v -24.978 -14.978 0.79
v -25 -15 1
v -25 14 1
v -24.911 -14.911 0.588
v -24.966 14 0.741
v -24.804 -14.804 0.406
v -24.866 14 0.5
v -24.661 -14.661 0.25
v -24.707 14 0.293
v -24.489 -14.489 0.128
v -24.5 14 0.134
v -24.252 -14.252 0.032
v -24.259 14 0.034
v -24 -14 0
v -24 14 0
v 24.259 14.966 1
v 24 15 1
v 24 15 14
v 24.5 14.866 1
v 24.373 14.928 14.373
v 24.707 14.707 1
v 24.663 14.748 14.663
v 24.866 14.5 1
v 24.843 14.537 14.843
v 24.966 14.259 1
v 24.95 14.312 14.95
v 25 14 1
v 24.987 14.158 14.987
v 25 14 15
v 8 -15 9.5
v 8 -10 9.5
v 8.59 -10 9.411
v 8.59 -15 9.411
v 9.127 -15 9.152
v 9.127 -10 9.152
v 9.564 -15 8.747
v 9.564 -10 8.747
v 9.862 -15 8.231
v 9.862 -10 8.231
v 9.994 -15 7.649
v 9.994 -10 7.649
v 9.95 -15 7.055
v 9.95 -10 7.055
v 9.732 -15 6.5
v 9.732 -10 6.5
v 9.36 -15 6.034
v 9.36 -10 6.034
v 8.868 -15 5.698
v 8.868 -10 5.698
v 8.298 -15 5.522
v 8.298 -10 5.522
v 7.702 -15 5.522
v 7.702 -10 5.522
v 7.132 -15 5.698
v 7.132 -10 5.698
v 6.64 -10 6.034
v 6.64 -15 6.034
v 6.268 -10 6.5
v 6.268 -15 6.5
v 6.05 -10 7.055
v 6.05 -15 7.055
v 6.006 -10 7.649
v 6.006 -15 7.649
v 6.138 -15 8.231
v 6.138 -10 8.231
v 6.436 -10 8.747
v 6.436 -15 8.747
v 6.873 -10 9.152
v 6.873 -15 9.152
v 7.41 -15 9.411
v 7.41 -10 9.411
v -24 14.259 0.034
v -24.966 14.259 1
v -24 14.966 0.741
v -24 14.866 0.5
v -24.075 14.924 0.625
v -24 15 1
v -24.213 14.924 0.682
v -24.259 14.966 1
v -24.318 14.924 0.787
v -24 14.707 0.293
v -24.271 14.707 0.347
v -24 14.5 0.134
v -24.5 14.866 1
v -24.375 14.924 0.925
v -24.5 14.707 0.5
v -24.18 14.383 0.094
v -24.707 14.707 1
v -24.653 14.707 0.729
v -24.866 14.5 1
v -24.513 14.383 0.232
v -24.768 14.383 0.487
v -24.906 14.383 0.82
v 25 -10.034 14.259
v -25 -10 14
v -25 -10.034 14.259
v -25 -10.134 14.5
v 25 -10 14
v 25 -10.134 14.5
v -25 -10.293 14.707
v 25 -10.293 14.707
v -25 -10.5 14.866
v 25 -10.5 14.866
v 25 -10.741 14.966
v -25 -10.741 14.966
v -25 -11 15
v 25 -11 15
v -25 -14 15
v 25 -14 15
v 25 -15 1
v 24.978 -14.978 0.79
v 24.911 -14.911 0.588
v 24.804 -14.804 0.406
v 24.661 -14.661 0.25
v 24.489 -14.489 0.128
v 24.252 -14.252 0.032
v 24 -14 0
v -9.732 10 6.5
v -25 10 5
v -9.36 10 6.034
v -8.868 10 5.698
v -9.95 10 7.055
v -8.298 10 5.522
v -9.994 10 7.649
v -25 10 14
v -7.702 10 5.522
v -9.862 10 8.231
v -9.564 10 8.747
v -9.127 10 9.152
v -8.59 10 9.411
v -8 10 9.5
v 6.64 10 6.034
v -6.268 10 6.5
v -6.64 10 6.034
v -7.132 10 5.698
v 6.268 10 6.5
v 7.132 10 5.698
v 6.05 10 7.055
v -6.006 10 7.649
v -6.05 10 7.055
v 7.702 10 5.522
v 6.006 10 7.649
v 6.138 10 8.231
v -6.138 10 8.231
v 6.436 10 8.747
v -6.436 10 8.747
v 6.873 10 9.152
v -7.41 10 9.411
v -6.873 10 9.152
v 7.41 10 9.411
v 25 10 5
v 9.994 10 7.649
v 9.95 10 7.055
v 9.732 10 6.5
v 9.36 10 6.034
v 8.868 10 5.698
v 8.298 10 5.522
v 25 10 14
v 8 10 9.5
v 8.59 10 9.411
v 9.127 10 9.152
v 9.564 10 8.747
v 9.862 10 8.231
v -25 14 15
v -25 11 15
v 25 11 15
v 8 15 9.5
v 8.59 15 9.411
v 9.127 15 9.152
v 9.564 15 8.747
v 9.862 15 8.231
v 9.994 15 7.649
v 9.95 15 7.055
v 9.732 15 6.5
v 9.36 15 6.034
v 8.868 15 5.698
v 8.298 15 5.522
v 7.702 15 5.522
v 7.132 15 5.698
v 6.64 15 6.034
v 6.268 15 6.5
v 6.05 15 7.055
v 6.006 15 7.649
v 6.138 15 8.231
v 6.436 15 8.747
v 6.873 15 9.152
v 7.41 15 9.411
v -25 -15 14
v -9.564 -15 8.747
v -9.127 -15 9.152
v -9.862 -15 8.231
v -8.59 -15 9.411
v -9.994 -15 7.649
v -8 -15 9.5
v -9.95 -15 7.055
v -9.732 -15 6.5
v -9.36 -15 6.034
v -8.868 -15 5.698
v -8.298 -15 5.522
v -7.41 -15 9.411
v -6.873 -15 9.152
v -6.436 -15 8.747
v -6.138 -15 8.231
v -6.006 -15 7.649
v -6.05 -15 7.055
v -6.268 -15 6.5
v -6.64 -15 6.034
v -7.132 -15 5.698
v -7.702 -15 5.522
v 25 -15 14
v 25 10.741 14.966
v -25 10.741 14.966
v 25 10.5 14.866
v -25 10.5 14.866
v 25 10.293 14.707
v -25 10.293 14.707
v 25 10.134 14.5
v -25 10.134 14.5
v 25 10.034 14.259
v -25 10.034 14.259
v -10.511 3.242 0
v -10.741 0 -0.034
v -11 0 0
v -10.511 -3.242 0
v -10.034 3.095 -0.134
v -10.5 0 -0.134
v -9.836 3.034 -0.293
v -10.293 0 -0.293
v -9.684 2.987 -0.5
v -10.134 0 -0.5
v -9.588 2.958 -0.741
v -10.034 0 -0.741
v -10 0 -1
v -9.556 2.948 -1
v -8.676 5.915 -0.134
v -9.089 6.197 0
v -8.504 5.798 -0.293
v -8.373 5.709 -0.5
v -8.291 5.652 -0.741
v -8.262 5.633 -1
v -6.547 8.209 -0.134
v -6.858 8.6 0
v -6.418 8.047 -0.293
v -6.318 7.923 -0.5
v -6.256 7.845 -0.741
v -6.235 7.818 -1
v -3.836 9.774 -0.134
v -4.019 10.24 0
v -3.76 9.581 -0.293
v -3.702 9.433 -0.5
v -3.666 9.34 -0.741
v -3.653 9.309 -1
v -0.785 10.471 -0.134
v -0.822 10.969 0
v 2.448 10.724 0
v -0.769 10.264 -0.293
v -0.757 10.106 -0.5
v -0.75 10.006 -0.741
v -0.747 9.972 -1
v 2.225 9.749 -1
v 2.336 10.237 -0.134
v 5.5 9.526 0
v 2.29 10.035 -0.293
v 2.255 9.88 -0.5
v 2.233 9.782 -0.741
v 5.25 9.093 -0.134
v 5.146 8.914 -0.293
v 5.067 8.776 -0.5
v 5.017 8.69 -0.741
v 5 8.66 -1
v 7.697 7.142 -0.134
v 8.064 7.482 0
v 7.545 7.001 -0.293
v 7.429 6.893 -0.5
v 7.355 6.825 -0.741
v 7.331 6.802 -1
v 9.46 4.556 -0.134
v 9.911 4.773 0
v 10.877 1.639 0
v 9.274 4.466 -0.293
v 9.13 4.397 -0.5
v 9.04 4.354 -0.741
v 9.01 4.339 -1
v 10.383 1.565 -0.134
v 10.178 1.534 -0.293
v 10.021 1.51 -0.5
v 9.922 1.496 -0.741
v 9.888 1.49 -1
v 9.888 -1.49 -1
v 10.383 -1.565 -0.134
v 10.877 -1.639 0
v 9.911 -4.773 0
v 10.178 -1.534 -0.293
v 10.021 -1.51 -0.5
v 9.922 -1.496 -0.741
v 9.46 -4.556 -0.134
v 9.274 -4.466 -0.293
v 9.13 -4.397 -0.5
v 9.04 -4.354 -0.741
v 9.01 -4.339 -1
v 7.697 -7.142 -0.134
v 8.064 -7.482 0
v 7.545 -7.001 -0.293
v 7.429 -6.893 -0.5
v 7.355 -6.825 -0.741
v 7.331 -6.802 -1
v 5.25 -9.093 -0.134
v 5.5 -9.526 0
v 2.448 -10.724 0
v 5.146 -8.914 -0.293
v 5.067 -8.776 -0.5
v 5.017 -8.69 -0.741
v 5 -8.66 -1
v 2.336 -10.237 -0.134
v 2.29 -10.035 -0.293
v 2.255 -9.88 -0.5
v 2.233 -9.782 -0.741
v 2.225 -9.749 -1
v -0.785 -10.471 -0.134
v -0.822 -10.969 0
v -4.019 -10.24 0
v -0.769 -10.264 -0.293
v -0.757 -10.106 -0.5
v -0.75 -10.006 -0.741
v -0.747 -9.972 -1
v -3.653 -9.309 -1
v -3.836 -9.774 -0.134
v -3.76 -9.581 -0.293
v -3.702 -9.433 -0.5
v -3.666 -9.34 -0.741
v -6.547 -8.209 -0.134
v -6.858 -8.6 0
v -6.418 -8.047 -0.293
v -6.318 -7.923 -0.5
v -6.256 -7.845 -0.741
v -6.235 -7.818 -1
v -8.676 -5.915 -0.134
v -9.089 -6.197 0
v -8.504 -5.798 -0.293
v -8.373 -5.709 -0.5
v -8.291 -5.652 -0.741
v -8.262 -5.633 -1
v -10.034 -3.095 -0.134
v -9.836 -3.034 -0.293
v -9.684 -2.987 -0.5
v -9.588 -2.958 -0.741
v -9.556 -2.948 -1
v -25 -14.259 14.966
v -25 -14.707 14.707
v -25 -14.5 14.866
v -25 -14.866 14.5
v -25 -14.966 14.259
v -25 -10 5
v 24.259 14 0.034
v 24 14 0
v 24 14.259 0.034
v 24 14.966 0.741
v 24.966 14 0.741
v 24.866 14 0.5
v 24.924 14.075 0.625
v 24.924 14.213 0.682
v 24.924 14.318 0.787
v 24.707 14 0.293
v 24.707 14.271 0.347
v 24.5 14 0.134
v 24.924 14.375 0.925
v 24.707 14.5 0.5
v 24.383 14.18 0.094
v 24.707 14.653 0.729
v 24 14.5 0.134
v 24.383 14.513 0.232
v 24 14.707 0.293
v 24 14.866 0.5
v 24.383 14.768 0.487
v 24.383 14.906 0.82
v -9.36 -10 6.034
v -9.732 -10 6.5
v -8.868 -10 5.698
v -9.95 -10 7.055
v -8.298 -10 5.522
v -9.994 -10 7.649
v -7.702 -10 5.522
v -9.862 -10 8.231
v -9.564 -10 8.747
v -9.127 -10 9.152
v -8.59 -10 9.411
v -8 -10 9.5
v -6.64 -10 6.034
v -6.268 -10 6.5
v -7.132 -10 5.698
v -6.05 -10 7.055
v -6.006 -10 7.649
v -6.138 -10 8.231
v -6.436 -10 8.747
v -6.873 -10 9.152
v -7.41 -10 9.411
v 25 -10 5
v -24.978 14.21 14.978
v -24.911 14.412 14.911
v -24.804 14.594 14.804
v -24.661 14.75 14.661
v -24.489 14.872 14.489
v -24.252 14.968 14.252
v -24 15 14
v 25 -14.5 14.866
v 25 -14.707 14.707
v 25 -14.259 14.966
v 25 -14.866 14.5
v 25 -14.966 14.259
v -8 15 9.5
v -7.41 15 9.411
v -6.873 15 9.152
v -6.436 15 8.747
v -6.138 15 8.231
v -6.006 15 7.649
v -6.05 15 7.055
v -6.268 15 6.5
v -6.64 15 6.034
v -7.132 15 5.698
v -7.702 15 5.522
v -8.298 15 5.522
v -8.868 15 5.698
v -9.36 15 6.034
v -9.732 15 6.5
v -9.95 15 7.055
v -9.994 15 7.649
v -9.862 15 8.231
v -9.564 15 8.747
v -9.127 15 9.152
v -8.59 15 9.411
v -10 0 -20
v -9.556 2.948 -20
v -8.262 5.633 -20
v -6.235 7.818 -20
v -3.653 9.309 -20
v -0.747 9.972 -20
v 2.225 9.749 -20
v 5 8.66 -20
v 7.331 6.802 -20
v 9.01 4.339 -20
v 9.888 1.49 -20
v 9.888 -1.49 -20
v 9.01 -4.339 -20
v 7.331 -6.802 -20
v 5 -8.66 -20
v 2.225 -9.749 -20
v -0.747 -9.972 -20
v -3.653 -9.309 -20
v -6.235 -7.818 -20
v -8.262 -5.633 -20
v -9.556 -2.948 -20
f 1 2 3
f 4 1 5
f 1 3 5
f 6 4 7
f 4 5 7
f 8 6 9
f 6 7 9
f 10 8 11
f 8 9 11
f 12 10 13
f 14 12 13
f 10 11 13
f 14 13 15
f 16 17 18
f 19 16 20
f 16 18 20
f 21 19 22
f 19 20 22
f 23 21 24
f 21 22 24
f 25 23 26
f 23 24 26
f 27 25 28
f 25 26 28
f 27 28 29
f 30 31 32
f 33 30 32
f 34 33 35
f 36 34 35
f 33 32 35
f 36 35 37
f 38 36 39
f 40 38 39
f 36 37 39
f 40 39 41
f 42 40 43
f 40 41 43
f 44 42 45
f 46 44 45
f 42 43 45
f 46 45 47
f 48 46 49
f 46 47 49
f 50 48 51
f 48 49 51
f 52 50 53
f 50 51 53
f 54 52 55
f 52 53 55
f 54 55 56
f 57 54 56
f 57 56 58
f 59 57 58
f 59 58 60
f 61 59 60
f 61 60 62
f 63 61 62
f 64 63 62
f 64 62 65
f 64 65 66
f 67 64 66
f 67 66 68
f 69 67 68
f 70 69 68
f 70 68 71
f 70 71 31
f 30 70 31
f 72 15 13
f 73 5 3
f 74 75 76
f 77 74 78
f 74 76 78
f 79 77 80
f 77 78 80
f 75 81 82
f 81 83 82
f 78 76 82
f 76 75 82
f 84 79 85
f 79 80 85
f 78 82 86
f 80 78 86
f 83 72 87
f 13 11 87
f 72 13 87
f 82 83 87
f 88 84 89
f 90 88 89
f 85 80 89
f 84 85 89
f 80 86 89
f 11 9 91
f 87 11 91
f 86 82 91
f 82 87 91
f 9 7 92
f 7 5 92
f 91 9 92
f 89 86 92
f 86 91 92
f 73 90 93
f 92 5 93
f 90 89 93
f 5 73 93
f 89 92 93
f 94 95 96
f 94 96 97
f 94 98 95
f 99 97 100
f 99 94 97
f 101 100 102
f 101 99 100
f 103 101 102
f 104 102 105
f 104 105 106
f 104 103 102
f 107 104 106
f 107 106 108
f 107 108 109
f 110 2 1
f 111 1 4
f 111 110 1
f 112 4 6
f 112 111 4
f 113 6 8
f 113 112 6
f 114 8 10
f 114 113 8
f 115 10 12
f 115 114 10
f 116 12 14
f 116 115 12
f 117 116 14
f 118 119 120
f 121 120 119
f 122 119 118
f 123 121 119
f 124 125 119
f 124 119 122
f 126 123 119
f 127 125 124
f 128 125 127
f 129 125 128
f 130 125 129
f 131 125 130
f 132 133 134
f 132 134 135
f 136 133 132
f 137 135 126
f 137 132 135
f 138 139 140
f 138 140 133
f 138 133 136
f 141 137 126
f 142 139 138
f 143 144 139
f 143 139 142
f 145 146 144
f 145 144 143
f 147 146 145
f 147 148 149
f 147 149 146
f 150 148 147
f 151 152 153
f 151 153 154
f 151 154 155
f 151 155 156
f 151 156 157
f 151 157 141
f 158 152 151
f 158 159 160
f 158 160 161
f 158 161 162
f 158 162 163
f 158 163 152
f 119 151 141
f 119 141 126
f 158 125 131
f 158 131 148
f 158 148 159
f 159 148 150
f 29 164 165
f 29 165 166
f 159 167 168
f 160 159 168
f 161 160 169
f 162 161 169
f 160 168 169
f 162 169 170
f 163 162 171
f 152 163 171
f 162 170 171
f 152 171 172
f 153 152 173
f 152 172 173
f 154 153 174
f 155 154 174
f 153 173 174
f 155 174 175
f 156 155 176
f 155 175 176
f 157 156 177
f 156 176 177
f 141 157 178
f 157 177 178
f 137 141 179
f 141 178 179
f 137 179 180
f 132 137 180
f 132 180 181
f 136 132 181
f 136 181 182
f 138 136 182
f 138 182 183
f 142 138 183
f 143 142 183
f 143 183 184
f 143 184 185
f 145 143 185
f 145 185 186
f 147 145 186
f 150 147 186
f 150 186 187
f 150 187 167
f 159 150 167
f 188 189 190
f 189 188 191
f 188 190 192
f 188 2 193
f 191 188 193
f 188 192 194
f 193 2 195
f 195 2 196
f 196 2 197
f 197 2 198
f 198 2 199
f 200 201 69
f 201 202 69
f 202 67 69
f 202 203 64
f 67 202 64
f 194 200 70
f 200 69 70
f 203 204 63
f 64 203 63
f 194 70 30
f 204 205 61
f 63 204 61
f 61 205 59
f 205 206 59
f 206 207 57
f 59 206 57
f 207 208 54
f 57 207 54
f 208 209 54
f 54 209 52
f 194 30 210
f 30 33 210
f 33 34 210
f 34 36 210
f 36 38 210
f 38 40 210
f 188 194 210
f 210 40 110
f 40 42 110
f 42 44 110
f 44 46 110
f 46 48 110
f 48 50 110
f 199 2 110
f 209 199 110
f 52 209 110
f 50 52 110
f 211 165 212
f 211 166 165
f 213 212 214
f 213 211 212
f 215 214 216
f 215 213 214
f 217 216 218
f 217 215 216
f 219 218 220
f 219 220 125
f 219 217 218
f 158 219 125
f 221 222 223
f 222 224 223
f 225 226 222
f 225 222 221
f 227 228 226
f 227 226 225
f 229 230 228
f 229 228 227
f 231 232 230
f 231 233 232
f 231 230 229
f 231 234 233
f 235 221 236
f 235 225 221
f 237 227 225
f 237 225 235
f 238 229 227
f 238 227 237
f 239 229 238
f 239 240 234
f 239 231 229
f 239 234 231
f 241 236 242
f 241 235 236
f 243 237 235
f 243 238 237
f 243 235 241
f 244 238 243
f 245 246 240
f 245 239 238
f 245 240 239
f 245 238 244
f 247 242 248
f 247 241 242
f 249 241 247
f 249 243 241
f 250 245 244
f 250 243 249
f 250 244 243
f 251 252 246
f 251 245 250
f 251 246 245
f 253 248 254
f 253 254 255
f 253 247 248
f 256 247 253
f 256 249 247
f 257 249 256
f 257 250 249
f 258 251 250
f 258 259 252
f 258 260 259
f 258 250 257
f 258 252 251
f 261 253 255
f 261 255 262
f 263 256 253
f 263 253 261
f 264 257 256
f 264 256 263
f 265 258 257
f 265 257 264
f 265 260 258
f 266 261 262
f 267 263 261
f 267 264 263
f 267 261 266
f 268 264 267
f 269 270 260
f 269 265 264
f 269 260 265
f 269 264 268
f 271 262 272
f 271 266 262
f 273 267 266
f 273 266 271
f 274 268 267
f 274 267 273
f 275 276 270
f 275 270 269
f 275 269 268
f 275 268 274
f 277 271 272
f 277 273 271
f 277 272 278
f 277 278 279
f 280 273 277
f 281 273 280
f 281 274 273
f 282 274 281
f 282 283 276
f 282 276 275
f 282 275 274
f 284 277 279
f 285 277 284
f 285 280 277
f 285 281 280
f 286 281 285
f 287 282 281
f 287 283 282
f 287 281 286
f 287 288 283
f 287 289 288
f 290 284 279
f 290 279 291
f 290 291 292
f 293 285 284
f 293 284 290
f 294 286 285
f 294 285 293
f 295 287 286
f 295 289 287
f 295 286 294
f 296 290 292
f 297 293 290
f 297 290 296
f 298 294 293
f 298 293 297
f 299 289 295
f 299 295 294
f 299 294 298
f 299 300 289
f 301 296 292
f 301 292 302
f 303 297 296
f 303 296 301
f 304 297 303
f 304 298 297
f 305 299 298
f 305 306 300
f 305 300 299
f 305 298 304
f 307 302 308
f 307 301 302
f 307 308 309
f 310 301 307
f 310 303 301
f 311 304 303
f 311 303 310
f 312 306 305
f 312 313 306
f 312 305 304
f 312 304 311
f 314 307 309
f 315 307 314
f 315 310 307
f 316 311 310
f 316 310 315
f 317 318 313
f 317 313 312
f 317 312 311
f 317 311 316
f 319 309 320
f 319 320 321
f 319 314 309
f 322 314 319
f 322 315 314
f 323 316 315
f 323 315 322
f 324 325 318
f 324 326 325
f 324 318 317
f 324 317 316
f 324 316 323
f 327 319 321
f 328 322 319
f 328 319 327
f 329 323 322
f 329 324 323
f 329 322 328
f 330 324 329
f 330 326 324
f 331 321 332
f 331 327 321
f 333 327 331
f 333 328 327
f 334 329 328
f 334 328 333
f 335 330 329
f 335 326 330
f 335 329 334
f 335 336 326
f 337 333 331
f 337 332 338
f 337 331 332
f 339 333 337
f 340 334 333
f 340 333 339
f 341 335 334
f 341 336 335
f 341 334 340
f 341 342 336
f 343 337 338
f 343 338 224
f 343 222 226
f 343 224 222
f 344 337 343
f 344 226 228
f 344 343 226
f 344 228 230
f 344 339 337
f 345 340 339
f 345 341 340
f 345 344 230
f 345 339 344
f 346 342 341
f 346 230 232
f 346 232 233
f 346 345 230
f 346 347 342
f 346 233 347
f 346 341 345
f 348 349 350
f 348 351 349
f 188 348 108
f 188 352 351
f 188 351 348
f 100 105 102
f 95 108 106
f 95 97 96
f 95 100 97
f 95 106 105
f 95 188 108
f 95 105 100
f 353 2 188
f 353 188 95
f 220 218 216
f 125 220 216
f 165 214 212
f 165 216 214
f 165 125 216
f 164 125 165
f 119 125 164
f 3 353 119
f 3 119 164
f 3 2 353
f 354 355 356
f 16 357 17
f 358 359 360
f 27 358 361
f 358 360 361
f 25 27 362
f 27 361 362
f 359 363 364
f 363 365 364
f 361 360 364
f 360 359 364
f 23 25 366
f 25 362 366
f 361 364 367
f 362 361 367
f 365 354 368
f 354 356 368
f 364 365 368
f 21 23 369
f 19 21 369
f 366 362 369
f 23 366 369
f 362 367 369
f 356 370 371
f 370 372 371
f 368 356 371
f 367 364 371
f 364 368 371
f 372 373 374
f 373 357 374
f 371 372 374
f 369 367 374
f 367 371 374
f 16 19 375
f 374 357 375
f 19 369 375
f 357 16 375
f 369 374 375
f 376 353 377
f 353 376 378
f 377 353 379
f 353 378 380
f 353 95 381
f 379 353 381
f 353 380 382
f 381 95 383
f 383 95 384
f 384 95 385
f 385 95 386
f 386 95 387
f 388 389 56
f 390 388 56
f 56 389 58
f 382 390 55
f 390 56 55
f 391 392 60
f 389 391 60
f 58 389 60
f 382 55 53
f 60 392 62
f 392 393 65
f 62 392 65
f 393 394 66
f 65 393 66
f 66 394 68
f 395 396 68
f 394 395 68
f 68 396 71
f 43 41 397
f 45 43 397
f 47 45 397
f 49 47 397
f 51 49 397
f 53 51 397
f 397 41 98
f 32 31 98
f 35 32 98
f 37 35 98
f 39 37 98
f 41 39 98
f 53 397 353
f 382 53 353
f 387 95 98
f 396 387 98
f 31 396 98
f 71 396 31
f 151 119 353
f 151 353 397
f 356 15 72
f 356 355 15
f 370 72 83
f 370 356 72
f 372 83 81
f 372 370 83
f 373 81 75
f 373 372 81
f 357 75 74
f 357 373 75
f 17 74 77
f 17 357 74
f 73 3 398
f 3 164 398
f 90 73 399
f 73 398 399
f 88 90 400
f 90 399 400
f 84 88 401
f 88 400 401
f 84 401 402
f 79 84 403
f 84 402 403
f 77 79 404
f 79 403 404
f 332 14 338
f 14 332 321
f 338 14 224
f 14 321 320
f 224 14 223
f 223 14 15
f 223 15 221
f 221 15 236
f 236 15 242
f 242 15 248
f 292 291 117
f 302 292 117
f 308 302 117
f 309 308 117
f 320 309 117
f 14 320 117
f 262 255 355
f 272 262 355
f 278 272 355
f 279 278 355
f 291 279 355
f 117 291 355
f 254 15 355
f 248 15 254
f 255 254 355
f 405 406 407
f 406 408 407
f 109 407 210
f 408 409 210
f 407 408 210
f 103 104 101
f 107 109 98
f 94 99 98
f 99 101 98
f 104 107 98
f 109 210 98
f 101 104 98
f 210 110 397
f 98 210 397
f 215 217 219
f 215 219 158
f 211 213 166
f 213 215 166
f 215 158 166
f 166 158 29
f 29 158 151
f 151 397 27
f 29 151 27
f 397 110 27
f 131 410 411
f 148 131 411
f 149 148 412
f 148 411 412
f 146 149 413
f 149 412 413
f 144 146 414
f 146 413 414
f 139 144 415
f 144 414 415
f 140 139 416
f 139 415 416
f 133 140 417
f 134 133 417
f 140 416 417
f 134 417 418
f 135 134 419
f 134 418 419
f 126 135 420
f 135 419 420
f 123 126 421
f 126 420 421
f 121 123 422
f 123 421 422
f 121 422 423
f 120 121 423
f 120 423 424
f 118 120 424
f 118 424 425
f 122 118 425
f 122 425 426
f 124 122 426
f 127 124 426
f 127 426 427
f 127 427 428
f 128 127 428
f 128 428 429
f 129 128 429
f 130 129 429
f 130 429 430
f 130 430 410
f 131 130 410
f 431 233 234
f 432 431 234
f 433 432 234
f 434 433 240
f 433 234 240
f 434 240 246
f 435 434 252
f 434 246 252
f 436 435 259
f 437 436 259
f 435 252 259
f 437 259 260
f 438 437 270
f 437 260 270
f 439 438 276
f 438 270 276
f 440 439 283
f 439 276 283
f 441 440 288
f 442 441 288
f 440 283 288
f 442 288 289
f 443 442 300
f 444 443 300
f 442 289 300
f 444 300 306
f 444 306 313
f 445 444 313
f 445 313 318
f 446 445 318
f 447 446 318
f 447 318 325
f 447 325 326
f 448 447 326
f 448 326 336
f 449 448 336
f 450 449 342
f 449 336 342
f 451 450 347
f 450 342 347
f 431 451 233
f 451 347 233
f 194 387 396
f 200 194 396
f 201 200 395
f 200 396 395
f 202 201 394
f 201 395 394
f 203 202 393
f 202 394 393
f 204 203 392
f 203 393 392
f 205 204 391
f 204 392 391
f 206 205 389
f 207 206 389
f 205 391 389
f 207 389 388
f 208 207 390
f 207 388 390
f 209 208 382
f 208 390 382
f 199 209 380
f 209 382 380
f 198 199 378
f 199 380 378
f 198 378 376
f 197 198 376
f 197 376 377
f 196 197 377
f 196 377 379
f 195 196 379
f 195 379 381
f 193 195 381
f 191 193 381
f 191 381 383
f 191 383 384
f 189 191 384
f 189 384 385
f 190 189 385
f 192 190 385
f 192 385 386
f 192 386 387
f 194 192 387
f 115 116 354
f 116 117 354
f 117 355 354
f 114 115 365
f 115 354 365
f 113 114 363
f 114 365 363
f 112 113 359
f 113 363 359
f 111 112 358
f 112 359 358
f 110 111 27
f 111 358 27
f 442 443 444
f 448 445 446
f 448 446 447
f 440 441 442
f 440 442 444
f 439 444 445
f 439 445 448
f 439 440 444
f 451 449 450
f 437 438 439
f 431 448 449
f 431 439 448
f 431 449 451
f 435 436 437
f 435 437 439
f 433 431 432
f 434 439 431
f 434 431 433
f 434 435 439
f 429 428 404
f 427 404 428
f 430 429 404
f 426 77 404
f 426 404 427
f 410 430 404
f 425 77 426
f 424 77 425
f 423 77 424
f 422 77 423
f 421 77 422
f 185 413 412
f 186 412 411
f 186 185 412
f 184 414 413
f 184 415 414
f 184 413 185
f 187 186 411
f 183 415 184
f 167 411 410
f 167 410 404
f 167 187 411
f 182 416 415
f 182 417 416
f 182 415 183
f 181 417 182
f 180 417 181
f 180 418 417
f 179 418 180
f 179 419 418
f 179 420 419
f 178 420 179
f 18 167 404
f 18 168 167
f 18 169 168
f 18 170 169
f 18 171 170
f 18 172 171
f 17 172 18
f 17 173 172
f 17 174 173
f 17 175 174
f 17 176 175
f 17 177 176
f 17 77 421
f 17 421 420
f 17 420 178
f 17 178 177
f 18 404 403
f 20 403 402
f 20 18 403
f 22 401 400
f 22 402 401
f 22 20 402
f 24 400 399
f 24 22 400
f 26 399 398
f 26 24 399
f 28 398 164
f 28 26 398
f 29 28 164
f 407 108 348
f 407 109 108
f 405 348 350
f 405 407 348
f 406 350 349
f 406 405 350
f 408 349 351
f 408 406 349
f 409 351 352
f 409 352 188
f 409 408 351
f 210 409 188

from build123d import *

# Parameters (mm, degrees)
SKETCH1_W           = 50
SKETCH1_H           = 30
BOSS_EXTRUDE1_DEPTH = 15
SKETCH2_W           = 50
SKETCH2_H           = 20
CUT_EXTRUDE1_DEPTH  = 10
SKETCH3_R           = 2
CUT_EXTRUDE2_DEPTH  = 42.833001327
SKETCH4_R           = 10
BOSS_EXTRUDE2_DEPTH = 20
FILLET3_R           = 1
FILLET4_R           = 1
FILLET5_R           = 1
FILLET6_R           = 1
FILLET7_R           = 1


with BuildPart() as part:
    # Sketch1 → Boss-Extrude1 (new body)
    with BuildSketch(Plane.XY):
        Rectangle(SKETCH1_W, SKETCH1_H)
    extrude(amount=BOSS_EXTRUDE1_DEPTH)

    # Sketch2 → Cut-Extrude1 (cut)
    with BuildSketch(Plane.XY.offset(15)):
        Rectangle(SKETCH2_W, SKETCH2_H)
    extrude(amount=-CUT_EXTRUDE1_DEPTH, mode=Mode.SUBTRACT)

    # Sketch3 → Cut-Extrude2 (cut, through all)
    with BuildSketch(Plane(origin=(0, 15, 0), x_dir=(1, 0, 0), z_dir=(0, 1, 0))):
        with Locations(Location((-8, -7.5, 0), (0, 0, 270))):
            Circle(SKETCH3_R)
        with Locations(Location((8, -7.5, 0), (0, 0, 270))):
            Circle(SKETCH3_R)
    extrude(amount=-CUT_EXTRUDE2_DEPTH, mode=Mode.SUBTRACT)

    # Sketch4 → Boss-Extrude2 (add)
    with BuildSketch(Plane(origin=(0, 0, 0), x_dir=(-1, 0, 0), z_dir=(0, 0, -1))):
        Circle(SKETCH4_R)
    extrude(amount=BOSS_EXTRUDE2_DEPTH)

    # Fillet3
    fillet3_edges = [part.edges().sort_by_distance(p)[0] for p in [
        (0, -10, 15),
    ]]
    fillet(fillet3_edges, radius=FILLET3_R)

    # Fillet4
    fillet4_edges = [part.edges().sort_by_distance(p)[0] for p in [
        (0, -15, 15),
    ]]
    fillet(fillet4_edges, radius=FILLET4_R)

    # Fillet5
    fillet5_edges = [part.edges().sort_by_distance(p)[0] for p in [
        (0, -15, 0),
        (-25, 0, 0),
        (0, 15, 0),
        (25, 0, 0),
        (-25, 15, 7.5),
        (25, 15, 7.5),
        (0, 15, 15),
    ]]
    fillet(fillet5_edges, radius=FILLET5_R)

    # Fillet6
    fillet6_edges = [part.edges().sort_by_distance(p)[0] for p in [
        (0, 10, 15),
    ]]
    fillet(fillet6_edges, radius=FILLET6_R)

    # Fillet7
    fillet7_edges = [part.edges().sort_by_distance(p)[0] for p in [
        (10, 0, 0),
    ]]
    fillet(fillet7_edges, radius=FILLET7_R)


solid = part.part
